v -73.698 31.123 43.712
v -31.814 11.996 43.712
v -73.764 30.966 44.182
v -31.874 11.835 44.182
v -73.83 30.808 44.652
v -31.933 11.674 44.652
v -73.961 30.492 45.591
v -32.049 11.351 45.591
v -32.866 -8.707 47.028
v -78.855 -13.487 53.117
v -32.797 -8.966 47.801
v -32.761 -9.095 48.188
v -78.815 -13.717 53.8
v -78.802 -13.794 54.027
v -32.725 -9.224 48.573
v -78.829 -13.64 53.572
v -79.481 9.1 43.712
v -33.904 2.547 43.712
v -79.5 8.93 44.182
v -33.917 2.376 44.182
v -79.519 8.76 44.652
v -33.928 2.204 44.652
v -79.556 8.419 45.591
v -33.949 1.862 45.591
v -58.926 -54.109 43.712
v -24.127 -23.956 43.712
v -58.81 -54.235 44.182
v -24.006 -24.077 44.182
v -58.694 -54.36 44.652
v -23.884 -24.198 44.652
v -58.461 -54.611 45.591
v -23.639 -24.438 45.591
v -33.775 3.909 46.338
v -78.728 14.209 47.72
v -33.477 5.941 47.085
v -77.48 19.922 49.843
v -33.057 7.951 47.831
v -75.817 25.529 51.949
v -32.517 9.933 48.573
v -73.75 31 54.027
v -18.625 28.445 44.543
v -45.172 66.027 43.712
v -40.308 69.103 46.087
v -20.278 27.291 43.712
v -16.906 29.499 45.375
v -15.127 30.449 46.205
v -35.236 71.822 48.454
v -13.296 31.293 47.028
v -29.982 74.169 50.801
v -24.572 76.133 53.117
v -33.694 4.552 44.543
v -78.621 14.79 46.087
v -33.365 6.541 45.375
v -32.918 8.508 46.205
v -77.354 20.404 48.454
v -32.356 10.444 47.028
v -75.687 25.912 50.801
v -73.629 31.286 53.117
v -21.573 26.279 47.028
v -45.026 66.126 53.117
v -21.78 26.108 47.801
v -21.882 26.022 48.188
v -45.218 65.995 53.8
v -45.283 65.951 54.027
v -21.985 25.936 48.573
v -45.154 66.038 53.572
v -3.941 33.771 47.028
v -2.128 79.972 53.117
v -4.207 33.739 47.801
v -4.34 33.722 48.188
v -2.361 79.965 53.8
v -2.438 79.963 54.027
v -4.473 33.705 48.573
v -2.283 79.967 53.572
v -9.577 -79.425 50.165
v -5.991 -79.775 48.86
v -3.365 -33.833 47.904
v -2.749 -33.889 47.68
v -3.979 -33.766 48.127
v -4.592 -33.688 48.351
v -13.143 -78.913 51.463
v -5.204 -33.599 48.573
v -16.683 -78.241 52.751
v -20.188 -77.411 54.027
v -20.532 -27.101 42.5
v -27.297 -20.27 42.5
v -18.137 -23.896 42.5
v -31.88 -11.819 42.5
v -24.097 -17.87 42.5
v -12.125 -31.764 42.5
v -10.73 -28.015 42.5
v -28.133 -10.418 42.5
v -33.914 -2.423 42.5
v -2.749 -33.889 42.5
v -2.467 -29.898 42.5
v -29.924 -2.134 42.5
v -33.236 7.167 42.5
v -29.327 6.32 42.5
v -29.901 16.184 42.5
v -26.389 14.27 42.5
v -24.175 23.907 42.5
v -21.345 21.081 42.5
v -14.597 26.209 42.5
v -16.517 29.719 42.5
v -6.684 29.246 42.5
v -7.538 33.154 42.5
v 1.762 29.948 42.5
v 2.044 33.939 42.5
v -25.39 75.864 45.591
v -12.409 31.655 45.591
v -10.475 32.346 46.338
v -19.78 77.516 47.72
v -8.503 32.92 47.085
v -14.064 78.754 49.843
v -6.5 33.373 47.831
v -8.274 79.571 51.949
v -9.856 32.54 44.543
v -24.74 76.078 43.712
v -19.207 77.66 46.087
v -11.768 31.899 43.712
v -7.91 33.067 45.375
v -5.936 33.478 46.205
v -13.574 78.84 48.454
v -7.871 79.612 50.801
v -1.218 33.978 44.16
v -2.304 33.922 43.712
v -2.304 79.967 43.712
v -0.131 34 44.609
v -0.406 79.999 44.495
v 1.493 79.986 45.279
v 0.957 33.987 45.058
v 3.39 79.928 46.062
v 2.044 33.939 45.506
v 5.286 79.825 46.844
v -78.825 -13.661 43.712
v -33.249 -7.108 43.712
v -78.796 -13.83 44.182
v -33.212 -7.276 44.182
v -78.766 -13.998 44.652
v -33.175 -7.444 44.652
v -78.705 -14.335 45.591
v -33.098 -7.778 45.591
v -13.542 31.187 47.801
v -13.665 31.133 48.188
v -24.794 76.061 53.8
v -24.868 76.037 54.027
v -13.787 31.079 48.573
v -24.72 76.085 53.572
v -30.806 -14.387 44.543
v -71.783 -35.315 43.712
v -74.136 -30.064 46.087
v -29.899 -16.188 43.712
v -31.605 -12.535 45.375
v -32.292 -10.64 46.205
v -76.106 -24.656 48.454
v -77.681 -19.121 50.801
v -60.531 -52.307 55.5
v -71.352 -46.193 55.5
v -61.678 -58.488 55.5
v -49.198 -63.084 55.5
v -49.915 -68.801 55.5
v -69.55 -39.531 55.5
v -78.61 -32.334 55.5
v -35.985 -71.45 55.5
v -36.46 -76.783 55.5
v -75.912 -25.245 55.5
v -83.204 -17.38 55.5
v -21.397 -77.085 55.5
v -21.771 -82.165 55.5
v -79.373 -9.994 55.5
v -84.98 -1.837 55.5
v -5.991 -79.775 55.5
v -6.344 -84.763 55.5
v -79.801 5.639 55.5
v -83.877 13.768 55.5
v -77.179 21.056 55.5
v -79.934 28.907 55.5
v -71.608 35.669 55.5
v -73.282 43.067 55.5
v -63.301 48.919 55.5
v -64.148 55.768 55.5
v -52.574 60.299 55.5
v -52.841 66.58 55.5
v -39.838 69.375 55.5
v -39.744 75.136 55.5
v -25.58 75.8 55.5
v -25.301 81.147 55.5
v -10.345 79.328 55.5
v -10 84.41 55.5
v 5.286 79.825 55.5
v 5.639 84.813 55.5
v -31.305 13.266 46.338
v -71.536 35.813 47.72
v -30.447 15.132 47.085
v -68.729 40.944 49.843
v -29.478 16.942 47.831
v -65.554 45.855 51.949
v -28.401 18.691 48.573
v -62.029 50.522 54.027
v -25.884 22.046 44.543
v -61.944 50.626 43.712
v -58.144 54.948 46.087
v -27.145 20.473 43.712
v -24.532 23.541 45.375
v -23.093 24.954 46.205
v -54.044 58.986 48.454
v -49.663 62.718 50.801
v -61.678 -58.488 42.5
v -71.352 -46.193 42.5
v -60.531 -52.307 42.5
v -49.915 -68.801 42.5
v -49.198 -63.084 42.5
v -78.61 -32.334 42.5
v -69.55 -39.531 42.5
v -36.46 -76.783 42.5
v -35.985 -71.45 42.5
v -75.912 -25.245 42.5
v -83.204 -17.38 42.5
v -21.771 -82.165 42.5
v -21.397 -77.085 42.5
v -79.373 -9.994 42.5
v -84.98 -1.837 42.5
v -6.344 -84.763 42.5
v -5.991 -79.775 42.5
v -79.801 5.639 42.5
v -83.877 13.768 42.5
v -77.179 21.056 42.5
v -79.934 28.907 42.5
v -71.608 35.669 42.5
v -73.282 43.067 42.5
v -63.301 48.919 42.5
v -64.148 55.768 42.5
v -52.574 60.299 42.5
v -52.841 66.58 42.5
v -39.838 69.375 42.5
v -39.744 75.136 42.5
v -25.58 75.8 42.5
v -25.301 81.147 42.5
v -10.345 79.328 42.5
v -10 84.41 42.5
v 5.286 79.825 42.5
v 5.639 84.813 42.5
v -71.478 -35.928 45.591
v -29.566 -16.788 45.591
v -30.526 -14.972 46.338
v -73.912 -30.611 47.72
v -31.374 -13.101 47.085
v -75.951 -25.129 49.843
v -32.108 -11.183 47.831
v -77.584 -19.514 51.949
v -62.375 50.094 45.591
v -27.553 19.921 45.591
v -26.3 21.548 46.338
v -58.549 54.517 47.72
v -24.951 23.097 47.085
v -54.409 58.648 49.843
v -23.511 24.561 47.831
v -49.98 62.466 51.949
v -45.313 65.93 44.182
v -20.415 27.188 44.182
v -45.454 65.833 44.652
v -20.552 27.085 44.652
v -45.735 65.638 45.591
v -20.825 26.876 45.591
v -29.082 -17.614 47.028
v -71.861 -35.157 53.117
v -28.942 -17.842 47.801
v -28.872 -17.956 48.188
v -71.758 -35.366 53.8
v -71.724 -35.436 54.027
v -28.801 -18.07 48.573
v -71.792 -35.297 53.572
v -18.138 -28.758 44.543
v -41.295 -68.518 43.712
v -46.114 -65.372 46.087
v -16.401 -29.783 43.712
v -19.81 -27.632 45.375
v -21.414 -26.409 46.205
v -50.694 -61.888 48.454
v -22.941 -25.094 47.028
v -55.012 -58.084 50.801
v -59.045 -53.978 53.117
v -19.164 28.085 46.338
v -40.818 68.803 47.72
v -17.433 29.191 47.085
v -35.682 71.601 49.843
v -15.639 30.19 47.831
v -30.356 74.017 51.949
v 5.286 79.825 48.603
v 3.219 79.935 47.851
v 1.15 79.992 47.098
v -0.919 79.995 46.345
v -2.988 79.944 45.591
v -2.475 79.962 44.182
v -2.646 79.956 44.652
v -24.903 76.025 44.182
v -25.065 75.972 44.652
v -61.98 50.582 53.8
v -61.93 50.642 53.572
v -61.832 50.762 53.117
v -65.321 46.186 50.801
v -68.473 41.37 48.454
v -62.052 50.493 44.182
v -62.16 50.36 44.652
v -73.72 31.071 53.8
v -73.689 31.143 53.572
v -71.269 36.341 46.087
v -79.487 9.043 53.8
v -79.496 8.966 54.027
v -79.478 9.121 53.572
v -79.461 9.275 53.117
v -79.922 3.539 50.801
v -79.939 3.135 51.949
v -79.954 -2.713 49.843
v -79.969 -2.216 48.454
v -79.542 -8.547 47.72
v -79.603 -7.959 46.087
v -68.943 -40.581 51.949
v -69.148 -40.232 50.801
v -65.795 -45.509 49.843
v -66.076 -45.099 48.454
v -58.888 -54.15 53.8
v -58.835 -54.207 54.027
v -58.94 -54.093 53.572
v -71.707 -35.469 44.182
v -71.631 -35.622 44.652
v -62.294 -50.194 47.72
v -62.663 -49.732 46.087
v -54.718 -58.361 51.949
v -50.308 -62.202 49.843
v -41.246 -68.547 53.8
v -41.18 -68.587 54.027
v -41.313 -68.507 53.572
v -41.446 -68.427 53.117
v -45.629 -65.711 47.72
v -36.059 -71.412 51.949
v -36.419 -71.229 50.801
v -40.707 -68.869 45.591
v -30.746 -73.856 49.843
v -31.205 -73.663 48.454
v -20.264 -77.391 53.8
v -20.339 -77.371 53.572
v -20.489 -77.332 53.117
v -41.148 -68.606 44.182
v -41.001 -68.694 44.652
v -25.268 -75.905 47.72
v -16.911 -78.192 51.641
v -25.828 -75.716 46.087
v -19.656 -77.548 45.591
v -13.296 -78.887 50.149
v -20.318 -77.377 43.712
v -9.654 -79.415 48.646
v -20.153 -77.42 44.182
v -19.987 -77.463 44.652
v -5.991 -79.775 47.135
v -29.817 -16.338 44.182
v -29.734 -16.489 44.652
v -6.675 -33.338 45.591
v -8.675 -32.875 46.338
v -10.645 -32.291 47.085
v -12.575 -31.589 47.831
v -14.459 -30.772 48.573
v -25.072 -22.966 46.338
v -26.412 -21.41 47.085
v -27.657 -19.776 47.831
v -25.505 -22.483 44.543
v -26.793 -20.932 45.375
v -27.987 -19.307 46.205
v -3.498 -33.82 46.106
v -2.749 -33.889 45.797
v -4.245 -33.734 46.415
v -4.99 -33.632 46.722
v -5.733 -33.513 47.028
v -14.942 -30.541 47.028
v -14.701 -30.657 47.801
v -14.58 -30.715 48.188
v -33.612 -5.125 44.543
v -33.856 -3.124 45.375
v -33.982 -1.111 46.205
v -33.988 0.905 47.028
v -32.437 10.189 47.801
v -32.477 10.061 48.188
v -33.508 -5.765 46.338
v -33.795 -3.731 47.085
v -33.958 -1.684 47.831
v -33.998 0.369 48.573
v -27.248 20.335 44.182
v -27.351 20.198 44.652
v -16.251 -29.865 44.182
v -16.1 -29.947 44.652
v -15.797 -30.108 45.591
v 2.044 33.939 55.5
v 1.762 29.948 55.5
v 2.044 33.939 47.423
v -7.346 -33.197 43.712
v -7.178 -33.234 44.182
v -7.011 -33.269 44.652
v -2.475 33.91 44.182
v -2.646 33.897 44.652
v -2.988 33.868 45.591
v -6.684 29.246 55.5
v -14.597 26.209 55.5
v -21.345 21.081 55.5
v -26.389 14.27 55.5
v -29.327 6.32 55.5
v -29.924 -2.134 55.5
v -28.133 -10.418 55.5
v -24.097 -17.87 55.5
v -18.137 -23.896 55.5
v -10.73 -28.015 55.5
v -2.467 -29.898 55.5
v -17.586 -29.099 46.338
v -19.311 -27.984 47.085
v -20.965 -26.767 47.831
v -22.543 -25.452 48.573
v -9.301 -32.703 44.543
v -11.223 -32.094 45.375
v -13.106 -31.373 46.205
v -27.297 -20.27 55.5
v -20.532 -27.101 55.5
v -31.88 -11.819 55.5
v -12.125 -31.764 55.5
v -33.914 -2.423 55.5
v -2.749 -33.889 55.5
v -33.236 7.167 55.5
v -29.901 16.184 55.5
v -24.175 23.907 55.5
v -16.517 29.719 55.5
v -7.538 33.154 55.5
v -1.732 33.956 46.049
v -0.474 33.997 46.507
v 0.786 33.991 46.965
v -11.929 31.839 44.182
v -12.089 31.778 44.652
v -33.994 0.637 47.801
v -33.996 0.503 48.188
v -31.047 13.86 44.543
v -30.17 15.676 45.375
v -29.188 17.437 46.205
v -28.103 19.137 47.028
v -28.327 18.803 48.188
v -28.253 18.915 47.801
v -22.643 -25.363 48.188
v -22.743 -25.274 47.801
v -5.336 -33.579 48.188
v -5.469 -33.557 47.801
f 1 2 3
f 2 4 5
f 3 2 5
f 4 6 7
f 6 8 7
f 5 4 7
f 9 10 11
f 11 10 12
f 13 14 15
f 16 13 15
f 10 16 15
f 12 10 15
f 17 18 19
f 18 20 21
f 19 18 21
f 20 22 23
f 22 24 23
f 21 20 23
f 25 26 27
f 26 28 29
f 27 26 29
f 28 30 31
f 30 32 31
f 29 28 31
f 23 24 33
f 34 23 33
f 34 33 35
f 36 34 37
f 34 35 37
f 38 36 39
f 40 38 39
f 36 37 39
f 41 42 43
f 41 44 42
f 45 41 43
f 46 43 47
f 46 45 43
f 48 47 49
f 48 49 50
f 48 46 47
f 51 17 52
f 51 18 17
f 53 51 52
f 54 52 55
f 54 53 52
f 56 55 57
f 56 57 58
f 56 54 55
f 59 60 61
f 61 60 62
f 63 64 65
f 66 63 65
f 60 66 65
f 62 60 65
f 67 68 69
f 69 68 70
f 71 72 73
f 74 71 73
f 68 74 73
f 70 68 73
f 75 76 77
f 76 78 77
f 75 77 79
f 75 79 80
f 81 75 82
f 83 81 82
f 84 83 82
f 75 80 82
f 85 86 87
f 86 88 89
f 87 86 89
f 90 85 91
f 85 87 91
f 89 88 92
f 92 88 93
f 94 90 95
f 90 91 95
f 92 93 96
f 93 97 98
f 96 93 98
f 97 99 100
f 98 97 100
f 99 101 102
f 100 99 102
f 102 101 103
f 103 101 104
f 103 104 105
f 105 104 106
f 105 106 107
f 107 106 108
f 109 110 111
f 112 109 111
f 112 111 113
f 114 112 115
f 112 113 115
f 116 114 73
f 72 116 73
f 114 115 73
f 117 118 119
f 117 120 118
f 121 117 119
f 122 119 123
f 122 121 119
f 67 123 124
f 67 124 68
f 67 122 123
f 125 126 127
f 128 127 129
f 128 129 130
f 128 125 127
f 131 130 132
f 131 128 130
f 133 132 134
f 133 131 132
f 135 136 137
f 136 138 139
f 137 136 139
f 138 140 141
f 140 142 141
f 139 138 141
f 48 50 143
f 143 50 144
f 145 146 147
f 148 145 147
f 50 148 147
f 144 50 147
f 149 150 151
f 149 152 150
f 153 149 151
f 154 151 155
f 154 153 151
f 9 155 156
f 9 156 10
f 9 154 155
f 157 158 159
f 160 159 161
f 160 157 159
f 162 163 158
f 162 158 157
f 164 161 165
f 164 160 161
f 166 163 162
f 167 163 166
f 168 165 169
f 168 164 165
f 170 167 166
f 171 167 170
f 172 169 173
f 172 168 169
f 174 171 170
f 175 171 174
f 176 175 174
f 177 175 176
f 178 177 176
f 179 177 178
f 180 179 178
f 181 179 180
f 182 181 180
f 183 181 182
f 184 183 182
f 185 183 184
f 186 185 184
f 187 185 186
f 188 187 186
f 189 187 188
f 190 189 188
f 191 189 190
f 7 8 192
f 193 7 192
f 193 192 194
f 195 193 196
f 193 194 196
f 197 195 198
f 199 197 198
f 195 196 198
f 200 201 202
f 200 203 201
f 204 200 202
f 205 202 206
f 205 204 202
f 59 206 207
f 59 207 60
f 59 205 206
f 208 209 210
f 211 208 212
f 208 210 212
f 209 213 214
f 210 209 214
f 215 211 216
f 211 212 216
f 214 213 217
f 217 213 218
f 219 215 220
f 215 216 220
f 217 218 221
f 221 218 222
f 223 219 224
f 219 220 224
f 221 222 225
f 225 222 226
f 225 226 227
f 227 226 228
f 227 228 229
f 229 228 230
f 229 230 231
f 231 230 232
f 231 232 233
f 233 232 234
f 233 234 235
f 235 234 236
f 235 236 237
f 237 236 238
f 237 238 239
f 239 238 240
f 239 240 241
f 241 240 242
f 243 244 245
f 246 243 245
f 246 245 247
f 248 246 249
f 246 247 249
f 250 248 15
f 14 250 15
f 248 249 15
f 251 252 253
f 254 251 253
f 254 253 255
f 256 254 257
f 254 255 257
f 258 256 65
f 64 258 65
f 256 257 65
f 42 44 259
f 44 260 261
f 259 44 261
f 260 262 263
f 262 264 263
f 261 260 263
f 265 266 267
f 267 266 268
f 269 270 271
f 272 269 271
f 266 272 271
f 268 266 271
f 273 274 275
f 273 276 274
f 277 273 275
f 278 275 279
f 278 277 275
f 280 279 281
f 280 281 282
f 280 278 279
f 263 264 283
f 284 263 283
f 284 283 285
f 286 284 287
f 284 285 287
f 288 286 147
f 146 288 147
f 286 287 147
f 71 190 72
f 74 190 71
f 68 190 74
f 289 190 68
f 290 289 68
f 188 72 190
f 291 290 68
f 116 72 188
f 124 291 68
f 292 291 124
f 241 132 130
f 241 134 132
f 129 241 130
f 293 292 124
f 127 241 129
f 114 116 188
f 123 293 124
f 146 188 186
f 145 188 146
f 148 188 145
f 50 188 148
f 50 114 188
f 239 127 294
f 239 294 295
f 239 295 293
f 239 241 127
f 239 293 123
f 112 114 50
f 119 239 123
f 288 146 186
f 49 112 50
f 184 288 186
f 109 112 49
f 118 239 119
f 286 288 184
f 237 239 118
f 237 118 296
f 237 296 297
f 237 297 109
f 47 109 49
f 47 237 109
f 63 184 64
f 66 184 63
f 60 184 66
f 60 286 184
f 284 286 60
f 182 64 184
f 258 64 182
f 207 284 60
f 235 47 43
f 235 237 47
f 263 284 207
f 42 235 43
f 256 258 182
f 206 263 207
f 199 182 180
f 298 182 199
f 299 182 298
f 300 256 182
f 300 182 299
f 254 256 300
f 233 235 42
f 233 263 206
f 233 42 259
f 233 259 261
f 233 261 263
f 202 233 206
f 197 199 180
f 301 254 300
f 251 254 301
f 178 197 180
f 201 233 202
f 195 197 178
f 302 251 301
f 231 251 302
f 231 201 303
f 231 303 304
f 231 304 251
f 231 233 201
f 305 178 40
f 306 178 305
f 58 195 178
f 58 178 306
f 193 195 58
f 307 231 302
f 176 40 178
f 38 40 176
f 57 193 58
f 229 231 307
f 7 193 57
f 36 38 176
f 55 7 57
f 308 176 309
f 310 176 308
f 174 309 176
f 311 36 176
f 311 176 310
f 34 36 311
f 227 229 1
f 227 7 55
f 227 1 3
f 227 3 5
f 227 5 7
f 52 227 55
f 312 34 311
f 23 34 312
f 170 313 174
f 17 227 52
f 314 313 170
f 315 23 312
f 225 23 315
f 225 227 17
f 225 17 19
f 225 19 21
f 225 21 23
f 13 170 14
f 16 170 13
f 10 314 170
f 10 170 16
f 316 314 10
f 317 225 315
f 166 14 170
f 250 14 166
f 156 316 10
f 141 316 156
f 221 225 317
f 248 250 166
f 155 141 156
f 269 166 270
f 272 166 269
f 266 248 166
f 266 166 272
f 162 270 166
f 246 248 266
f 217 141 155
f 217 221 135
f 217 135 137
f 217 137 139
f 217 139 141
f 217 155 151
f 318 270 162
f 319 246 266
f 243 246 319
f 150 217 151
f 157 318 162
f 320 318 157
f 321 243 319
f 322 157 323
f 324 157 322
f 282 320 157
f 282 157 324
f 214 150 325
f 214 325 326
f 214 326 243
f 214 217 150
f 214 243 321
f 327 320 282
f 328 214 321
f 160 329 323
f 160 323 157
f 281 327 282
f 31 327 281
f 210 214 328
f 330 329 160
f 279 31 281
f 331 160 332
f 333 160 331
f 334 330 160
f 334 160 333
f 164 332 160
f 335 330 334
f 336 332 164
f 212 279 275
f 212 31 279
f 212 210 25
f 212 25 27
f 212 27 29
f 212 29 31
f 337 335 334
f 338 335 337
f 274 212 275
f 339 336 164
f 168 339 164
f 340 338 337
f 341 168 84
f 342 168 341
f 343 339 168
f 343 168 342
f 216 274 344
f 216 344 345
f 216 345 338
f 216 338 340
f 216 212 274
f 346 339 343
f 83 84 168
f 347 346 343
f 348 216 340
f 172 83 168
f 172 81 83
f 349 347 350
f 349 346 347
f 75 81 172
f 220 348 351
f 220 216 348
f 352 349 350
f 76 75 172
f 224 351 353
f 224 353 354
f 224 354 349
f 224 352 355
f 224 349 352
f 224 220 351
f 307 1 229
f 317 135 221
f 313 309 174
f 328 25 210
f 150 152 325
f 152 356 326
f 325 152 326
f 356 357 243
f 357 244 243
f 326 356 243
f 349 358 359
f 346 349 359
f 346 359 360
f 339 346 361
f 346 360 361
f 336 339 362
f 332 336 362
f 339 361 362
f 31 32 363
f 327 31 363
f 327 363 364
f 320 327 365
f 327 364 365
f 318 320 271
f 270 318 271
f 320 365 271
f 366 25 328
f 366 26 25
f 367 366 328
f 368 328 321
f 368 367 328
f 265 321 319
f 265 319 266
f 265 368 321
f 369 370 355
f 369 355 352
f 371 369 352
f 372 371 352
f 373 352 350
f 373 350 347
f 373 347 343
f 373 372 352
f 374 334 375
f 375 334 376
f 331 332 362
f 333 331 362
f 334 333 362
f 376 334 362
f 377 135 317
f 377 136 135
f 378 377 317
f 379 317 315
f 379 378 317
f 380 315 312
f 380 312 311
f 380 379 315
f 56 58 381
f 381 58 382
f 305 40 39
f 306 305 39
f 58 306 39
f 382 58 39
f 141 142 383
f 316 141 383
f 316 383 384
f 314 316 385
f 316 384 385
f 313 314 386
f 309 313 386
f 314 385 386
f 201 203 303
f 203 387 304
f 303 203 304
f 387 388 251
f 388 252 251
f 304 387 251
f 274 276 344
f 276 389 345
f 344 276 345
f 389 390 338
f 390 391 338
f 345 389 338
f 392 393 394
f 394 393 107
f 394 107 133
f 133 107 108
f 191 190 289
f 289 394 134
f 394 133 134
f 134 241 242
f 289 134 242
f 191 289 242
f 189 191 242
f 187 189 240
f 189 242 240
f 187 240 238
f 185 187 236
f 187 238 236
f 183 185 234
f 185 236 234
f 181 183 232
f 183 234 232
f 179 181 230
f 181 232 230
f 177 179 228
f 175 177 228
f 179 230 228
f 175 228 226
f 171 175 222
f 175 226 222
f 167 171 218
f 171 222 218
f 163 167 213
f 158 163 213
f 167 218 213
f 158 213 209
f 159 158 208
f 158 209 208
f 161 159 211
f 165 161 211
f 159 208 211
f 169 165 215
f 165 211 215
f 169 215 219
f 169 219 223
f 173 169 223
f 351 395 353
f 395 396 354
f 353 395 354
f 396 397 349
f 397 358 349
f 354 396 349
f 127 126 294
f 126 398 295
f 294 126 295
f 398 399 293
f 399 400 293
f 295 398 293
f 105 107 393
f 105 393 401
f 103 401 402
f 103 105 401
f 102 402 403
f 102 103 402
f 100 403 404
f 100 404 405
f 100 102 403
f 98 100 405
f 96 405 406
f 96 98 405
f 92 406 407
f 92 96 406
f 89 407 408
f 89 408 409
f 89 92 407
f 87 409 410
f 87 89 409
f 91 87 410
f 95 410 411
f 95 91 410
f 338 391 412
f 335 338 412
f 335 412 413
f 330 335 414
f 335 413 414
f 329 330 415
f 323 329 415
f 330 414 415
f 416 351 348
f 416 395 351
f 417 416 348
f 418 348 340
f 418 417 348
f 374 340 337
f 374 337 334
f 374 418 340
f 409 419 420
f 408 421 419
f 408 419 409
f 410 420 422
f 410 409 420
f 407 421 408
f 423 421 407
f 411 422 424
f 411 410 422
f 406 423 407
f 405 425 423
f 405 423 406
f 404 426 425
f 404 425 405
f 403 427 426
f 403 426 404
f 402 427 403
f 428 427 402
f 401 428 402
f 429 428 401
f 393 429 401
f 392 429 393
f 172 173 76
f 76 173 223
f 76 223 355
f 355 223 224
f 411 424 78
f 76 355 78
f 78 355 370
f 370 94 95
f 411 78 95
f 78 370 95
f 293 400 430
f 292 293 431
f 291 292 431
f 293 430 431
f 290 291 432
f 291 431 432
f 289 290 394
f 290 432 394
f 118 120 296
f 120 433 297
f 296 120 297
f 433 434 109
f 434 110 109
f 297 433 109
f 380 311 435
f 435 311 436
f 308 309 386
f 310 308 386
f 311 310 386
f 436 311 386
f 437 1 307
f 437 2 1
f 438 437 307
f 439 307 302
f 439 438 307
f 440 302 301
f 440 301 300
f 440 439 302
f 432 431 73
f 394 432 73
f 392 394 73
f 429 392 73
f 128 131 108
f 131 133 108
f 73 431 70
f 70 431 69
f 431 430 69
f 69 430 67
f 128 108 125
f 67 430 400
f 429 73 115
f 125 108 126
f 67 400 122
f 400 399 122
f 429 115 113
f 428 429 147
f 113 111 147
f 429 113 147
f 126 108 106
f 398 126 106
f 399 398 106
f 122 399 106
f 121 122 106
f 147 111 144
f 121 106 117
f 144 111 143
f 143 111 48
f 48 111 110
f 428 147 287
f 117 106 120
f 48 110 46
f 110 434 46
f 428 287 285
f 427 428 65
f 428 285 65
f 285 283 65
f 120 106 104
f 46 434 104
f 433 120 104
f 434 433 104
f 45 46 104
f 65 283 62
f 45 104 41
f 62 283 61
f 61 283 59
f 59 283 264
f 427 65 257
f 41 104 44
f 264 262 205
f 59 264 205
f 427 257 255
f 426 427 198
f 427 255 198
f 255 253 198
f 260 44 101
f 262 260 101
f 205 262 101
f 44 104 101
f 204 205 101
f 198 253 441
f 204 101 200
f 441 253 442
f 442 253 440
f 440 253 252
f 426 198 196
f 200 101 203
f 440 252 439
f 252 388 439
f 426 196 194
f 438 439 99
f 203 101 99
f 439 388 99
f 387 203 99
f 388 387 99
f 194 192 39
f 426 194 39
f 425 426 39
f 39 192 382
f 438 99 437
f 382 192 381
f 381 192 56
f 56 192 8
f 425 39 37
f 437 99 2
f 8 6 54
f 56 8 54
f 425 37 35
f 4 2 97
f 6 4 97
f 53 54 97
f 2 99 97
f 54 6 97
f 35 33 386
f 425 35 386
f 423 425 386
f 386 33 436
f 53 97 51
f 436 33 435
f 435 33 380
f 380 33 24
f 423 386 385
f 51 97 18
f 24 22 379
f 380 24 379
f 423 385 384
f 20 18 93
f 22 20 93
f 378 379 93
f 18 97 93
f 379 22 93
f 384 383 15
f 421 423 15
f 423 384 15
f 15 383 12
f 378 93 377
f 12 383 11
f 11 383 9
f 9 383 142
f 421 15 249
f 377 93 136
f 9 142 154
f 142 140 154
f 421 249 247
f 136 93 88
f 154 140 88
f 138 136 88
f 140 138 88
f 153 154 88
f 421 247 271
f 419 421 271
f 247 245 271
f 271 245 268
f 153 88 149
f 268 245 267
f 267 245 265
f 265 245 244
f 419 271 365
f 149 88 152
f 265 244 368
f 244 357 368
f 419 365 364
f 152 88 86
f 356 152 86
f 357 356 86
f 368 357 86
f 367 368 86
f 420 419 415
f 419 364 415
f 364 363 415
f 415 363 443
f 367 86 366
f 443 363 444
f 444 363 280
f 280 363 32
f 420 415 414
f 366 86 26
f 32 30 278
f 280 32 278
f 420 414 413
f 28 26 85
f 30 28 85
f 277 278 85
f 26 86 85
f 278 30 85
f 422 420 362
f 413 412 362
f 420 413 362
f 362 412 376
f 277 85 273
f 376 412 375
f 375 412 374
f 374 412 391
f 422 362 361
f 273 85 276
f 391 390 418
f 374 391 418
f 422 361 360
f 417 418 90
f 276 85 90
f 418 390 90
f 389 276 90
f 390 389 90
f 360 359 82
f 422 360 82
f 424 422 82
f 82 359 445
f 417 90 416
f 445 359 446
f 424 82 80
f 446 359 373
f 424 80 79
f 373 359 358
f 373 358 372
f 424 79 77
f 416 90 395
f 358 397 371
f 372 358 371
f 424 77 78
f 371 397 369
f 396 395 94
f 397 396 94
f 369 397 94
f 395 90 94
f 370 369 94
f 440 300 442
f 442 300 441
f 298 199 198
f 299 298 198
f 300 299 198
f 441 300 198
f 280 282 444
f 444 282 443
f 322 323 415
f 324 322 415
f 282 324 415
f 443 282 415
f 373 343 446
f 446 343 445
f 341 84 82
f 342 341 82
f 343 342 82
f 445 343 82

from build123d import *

# Parameters (mm, degrees)
TUBE043_R                 = 85
TUBE043_R_2               = 80
TUBE043_DEPTH             = 13
TUBE042_R                 = 100
TUBE042_R_2               = 80
TUBE042_DEPTH             = 200
PAD041_DEPTH              = 100
PAD042_DEPTH              = 2
COMMON020_PLACEMENT_ANGLE = 20
ARRAY017_COUNT            = 22
ARRAY017_PLACEMENT_ANGLE  = 180
TUBE044_R                 = 34
TUBE044_R_2               = 30
TUBE044_DEPTH             = 13
PAD040_DEPTH              = 100


with BuildPart() as tube043:
    # Tube043 → Tube043 (new body)
    with BuildSketch(Plane.XY.offset(42.5)):
        Circle(TUBE043_R)
        Circle(TUBE043_R_2, mode=Mode.SUBTRACT)
    extrude(amount=TUBE043_DEPTH)


with BuildPart() as tube042:
    # Tube042 → Tube042 (new body)
    with BuildSketch(Plane.XY):
        Circle(TUBE042_R)
        Circle(TUBE042_R_2, mode=Mode.SUBTRACT)
    extrude(amount=TUBE042_DEPTH)


with BuildPart() as body042:
    # Sketch041 → Pad041 (new body)
    with BuildSketch(Plane.XZ):
        Polygon((0, 0), (0, 2), (26, 0.9), (26, 0), align=None)
    extrude(amount=PAD041_DEPTH)


with BuildPart() as body042_1:
    # Body042 placement: moved
    add(body042.part.moved(Location((-5, 0, 5))))


with BuildPart() as cut014:
    # Sketch042 → Pad042 (new body)
    with BuildSketch(Plane.XY):
        Polygon((0, 0), (0, -52), (25.94305, -47.924315), (8.5, 0), align=None)
    extrude(amount=PAD042_DEPTH)


with BuildPart() as cut014_1:
    # Body043 placement: moved
    add(cut014.part.moved(Location((-5, -33, 5))))

    # Common020: intersect Body042
    add(body042_1.part, mode=Mode.INTERSECT)


with BuildPart() as cut014_2:
    # Common020 placement: moved
    add(cut014_1.part.rotate(Axis((0, 0, 0), (0, 1, 0)), COMMON020_PLACEMENT_ANGLE))

    # Array017: Cut014 ×22 about axis
    array017_axis = Axis((0, 0, 0), (0, 0, 1))


with BuildPart() as cut014_3:
    add(cut014_2.part)
    for i in range(1, ARRAY017_COUNT):
        add(cut014_2.part.rotate(array017_axis, i * 360 / ARRAY017_COUNT))


with BuildPart() as cut014_4:
    # Array017 placement: moved
    add(cut014_3.part.moved(Location((0, 0, 52))).rotate(Axis((0, 0, 52), (0, 1, 0)), ARRAY017_PLACEMENT_ANGLE))

    # Cut014: cut Tube042
    add(tube042.part, mode=Mode.SUBTRACT)


with BuildPart() as pre3stat001:
    # Tube044 → Tube044 (new body)
    with BuildSketch(Plane.XY.offset(42.5)):
        Circle(TUBE044_R)
        Circle(TUBE044_R_2, mode=Mode.SUBTRACT)
    extrude(amount=TUBE044_DEPTH)

    # Fusion019: union Tube043, Cut014
    add(tube043.part)
    add(cut014_4.part)


with BuildPart() as stator3h1:
    # Sketch040 → Pad040 (new body)
    with BuildSketch(Plane.XY):
        Polygon((-6.733461, -90.278511), (6.859371, 102.08947), (-116.658012, 102.08947), (-116.658012, -85.846069), align=None)
    extrude(amount=PAD040_DEPTH)

    # Common021: intersect Pre3Stat001
    add(pre3stat001.part, mode=Mode.INTERSECT)


solid = stator3h1.part
